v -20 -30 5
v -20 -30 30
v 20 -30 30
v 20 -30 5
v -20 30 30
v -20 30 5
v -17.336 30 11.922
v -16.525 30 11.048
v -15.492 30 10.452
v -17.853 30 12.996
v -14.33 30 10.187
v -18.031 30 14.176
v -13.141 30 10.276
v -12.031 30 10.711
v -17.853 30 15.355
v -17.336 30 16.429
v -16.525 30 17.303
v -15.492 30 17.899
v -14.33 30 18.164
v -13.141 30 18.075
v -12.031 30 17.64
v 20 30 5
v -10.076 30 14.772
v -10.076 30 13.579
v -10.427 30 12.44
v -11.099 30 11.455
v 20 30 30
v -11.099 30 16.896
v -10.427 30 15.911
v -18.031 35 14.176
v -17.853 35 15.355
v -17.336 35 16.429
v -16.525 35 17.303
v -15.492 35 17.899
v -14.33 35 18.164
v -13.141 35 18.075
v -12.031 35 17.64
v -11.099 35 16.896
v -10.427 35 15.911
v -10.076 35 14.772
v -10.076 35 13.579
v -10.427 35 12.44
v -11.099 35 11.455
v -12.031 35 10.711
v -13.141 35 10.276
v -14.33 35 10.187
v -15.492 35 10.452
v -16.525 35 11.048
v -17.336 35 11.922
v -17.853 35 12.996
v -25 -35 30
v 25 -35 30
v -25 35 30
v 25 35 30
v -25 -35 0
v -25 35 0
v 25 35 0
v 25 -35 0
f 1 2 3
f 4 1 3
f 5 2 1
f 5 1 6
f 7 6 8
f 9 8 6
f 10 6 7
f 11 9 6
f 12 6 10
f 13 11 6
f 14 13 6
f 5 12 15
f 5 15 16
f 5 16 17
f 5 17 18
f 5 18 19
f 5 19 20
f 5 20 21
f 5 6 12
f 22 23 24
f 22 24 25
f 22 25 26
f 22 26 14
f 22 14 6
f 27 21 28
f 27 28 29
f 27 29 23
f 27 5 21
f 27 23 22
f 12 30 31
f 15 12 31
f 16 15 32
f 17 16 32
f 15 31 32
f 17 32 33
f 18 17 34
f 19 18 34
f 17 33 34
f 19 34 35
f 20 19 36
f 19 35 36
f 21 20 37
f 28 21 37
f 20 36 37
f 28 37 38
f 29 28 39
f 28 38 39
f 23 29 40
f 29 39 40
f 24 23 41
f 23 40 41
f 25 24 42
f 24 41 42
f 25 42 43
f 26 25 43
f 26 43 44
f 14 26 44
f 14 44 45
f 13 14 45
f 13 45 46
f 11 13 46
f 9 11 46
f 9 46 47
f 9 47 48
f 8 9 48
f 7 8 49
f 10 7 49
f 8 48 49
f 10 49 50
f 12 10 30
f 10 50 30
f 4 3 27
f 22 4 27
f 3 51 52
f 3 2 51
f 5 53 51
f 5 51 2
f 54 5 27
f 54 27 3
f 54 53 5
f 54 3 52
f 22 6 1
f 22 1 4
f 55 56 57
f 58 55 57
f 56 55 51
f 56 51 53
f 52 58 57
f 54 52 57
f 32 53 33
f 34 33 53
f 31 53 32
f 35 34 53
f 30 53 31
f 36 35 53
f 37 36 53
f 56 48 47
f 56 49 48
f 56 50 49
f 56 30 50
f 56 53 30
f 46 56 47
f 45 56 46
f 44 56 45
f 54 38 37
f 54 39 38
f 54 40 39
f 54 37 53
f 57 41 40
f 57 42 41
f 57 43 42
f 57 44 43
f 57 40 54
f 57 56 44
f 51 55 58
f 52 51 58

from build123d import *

# Parameters (mm, degrees)
F0_W     = 50
F0_H     = 70
F0_W_2   = 40
F0_H_2   = 60
F1_DEPTH = 30
F2_W     = 40
F2_H     = 60
F3_DEPTH = 25
F4_R     = 4
F5_DEPTH = 5


with BuildPart() as f1:
    # F0 (on Top) → F1 (new body)
    with BuildSketch(Plane.XY):
        Rectangle(F0_W, F0_H)
        Rectangle(F0_W_2, F0_H_2, mode=Mode.SUBTRACT)
        Rectangle(F0_W_2, F0_H_2)
    extrude(amount=F1_DEPTH)

    # F2 (on face) → F3 (cut)
    with BuildSketch(Plane.XY.offset(30)):
        Rectangle(F2_W, F2_H)
    extrude(amount=-F3_DEPTH, mode=Mode.SUBTRACT)

    # F4 (on face) → F5 (cut, through all)
    with BuildSketch(Plane(origin=(0, 35, 0), x_dir=(-1, 0, 0), z_dir=(0, 1, 0))):
        with Locations((14.030943, 14.175501)):
            Circle(F4_R)
    extrude(amount=-F5_DEPTH, mode=Mode.SUBTRACT)


solid = f1.part
